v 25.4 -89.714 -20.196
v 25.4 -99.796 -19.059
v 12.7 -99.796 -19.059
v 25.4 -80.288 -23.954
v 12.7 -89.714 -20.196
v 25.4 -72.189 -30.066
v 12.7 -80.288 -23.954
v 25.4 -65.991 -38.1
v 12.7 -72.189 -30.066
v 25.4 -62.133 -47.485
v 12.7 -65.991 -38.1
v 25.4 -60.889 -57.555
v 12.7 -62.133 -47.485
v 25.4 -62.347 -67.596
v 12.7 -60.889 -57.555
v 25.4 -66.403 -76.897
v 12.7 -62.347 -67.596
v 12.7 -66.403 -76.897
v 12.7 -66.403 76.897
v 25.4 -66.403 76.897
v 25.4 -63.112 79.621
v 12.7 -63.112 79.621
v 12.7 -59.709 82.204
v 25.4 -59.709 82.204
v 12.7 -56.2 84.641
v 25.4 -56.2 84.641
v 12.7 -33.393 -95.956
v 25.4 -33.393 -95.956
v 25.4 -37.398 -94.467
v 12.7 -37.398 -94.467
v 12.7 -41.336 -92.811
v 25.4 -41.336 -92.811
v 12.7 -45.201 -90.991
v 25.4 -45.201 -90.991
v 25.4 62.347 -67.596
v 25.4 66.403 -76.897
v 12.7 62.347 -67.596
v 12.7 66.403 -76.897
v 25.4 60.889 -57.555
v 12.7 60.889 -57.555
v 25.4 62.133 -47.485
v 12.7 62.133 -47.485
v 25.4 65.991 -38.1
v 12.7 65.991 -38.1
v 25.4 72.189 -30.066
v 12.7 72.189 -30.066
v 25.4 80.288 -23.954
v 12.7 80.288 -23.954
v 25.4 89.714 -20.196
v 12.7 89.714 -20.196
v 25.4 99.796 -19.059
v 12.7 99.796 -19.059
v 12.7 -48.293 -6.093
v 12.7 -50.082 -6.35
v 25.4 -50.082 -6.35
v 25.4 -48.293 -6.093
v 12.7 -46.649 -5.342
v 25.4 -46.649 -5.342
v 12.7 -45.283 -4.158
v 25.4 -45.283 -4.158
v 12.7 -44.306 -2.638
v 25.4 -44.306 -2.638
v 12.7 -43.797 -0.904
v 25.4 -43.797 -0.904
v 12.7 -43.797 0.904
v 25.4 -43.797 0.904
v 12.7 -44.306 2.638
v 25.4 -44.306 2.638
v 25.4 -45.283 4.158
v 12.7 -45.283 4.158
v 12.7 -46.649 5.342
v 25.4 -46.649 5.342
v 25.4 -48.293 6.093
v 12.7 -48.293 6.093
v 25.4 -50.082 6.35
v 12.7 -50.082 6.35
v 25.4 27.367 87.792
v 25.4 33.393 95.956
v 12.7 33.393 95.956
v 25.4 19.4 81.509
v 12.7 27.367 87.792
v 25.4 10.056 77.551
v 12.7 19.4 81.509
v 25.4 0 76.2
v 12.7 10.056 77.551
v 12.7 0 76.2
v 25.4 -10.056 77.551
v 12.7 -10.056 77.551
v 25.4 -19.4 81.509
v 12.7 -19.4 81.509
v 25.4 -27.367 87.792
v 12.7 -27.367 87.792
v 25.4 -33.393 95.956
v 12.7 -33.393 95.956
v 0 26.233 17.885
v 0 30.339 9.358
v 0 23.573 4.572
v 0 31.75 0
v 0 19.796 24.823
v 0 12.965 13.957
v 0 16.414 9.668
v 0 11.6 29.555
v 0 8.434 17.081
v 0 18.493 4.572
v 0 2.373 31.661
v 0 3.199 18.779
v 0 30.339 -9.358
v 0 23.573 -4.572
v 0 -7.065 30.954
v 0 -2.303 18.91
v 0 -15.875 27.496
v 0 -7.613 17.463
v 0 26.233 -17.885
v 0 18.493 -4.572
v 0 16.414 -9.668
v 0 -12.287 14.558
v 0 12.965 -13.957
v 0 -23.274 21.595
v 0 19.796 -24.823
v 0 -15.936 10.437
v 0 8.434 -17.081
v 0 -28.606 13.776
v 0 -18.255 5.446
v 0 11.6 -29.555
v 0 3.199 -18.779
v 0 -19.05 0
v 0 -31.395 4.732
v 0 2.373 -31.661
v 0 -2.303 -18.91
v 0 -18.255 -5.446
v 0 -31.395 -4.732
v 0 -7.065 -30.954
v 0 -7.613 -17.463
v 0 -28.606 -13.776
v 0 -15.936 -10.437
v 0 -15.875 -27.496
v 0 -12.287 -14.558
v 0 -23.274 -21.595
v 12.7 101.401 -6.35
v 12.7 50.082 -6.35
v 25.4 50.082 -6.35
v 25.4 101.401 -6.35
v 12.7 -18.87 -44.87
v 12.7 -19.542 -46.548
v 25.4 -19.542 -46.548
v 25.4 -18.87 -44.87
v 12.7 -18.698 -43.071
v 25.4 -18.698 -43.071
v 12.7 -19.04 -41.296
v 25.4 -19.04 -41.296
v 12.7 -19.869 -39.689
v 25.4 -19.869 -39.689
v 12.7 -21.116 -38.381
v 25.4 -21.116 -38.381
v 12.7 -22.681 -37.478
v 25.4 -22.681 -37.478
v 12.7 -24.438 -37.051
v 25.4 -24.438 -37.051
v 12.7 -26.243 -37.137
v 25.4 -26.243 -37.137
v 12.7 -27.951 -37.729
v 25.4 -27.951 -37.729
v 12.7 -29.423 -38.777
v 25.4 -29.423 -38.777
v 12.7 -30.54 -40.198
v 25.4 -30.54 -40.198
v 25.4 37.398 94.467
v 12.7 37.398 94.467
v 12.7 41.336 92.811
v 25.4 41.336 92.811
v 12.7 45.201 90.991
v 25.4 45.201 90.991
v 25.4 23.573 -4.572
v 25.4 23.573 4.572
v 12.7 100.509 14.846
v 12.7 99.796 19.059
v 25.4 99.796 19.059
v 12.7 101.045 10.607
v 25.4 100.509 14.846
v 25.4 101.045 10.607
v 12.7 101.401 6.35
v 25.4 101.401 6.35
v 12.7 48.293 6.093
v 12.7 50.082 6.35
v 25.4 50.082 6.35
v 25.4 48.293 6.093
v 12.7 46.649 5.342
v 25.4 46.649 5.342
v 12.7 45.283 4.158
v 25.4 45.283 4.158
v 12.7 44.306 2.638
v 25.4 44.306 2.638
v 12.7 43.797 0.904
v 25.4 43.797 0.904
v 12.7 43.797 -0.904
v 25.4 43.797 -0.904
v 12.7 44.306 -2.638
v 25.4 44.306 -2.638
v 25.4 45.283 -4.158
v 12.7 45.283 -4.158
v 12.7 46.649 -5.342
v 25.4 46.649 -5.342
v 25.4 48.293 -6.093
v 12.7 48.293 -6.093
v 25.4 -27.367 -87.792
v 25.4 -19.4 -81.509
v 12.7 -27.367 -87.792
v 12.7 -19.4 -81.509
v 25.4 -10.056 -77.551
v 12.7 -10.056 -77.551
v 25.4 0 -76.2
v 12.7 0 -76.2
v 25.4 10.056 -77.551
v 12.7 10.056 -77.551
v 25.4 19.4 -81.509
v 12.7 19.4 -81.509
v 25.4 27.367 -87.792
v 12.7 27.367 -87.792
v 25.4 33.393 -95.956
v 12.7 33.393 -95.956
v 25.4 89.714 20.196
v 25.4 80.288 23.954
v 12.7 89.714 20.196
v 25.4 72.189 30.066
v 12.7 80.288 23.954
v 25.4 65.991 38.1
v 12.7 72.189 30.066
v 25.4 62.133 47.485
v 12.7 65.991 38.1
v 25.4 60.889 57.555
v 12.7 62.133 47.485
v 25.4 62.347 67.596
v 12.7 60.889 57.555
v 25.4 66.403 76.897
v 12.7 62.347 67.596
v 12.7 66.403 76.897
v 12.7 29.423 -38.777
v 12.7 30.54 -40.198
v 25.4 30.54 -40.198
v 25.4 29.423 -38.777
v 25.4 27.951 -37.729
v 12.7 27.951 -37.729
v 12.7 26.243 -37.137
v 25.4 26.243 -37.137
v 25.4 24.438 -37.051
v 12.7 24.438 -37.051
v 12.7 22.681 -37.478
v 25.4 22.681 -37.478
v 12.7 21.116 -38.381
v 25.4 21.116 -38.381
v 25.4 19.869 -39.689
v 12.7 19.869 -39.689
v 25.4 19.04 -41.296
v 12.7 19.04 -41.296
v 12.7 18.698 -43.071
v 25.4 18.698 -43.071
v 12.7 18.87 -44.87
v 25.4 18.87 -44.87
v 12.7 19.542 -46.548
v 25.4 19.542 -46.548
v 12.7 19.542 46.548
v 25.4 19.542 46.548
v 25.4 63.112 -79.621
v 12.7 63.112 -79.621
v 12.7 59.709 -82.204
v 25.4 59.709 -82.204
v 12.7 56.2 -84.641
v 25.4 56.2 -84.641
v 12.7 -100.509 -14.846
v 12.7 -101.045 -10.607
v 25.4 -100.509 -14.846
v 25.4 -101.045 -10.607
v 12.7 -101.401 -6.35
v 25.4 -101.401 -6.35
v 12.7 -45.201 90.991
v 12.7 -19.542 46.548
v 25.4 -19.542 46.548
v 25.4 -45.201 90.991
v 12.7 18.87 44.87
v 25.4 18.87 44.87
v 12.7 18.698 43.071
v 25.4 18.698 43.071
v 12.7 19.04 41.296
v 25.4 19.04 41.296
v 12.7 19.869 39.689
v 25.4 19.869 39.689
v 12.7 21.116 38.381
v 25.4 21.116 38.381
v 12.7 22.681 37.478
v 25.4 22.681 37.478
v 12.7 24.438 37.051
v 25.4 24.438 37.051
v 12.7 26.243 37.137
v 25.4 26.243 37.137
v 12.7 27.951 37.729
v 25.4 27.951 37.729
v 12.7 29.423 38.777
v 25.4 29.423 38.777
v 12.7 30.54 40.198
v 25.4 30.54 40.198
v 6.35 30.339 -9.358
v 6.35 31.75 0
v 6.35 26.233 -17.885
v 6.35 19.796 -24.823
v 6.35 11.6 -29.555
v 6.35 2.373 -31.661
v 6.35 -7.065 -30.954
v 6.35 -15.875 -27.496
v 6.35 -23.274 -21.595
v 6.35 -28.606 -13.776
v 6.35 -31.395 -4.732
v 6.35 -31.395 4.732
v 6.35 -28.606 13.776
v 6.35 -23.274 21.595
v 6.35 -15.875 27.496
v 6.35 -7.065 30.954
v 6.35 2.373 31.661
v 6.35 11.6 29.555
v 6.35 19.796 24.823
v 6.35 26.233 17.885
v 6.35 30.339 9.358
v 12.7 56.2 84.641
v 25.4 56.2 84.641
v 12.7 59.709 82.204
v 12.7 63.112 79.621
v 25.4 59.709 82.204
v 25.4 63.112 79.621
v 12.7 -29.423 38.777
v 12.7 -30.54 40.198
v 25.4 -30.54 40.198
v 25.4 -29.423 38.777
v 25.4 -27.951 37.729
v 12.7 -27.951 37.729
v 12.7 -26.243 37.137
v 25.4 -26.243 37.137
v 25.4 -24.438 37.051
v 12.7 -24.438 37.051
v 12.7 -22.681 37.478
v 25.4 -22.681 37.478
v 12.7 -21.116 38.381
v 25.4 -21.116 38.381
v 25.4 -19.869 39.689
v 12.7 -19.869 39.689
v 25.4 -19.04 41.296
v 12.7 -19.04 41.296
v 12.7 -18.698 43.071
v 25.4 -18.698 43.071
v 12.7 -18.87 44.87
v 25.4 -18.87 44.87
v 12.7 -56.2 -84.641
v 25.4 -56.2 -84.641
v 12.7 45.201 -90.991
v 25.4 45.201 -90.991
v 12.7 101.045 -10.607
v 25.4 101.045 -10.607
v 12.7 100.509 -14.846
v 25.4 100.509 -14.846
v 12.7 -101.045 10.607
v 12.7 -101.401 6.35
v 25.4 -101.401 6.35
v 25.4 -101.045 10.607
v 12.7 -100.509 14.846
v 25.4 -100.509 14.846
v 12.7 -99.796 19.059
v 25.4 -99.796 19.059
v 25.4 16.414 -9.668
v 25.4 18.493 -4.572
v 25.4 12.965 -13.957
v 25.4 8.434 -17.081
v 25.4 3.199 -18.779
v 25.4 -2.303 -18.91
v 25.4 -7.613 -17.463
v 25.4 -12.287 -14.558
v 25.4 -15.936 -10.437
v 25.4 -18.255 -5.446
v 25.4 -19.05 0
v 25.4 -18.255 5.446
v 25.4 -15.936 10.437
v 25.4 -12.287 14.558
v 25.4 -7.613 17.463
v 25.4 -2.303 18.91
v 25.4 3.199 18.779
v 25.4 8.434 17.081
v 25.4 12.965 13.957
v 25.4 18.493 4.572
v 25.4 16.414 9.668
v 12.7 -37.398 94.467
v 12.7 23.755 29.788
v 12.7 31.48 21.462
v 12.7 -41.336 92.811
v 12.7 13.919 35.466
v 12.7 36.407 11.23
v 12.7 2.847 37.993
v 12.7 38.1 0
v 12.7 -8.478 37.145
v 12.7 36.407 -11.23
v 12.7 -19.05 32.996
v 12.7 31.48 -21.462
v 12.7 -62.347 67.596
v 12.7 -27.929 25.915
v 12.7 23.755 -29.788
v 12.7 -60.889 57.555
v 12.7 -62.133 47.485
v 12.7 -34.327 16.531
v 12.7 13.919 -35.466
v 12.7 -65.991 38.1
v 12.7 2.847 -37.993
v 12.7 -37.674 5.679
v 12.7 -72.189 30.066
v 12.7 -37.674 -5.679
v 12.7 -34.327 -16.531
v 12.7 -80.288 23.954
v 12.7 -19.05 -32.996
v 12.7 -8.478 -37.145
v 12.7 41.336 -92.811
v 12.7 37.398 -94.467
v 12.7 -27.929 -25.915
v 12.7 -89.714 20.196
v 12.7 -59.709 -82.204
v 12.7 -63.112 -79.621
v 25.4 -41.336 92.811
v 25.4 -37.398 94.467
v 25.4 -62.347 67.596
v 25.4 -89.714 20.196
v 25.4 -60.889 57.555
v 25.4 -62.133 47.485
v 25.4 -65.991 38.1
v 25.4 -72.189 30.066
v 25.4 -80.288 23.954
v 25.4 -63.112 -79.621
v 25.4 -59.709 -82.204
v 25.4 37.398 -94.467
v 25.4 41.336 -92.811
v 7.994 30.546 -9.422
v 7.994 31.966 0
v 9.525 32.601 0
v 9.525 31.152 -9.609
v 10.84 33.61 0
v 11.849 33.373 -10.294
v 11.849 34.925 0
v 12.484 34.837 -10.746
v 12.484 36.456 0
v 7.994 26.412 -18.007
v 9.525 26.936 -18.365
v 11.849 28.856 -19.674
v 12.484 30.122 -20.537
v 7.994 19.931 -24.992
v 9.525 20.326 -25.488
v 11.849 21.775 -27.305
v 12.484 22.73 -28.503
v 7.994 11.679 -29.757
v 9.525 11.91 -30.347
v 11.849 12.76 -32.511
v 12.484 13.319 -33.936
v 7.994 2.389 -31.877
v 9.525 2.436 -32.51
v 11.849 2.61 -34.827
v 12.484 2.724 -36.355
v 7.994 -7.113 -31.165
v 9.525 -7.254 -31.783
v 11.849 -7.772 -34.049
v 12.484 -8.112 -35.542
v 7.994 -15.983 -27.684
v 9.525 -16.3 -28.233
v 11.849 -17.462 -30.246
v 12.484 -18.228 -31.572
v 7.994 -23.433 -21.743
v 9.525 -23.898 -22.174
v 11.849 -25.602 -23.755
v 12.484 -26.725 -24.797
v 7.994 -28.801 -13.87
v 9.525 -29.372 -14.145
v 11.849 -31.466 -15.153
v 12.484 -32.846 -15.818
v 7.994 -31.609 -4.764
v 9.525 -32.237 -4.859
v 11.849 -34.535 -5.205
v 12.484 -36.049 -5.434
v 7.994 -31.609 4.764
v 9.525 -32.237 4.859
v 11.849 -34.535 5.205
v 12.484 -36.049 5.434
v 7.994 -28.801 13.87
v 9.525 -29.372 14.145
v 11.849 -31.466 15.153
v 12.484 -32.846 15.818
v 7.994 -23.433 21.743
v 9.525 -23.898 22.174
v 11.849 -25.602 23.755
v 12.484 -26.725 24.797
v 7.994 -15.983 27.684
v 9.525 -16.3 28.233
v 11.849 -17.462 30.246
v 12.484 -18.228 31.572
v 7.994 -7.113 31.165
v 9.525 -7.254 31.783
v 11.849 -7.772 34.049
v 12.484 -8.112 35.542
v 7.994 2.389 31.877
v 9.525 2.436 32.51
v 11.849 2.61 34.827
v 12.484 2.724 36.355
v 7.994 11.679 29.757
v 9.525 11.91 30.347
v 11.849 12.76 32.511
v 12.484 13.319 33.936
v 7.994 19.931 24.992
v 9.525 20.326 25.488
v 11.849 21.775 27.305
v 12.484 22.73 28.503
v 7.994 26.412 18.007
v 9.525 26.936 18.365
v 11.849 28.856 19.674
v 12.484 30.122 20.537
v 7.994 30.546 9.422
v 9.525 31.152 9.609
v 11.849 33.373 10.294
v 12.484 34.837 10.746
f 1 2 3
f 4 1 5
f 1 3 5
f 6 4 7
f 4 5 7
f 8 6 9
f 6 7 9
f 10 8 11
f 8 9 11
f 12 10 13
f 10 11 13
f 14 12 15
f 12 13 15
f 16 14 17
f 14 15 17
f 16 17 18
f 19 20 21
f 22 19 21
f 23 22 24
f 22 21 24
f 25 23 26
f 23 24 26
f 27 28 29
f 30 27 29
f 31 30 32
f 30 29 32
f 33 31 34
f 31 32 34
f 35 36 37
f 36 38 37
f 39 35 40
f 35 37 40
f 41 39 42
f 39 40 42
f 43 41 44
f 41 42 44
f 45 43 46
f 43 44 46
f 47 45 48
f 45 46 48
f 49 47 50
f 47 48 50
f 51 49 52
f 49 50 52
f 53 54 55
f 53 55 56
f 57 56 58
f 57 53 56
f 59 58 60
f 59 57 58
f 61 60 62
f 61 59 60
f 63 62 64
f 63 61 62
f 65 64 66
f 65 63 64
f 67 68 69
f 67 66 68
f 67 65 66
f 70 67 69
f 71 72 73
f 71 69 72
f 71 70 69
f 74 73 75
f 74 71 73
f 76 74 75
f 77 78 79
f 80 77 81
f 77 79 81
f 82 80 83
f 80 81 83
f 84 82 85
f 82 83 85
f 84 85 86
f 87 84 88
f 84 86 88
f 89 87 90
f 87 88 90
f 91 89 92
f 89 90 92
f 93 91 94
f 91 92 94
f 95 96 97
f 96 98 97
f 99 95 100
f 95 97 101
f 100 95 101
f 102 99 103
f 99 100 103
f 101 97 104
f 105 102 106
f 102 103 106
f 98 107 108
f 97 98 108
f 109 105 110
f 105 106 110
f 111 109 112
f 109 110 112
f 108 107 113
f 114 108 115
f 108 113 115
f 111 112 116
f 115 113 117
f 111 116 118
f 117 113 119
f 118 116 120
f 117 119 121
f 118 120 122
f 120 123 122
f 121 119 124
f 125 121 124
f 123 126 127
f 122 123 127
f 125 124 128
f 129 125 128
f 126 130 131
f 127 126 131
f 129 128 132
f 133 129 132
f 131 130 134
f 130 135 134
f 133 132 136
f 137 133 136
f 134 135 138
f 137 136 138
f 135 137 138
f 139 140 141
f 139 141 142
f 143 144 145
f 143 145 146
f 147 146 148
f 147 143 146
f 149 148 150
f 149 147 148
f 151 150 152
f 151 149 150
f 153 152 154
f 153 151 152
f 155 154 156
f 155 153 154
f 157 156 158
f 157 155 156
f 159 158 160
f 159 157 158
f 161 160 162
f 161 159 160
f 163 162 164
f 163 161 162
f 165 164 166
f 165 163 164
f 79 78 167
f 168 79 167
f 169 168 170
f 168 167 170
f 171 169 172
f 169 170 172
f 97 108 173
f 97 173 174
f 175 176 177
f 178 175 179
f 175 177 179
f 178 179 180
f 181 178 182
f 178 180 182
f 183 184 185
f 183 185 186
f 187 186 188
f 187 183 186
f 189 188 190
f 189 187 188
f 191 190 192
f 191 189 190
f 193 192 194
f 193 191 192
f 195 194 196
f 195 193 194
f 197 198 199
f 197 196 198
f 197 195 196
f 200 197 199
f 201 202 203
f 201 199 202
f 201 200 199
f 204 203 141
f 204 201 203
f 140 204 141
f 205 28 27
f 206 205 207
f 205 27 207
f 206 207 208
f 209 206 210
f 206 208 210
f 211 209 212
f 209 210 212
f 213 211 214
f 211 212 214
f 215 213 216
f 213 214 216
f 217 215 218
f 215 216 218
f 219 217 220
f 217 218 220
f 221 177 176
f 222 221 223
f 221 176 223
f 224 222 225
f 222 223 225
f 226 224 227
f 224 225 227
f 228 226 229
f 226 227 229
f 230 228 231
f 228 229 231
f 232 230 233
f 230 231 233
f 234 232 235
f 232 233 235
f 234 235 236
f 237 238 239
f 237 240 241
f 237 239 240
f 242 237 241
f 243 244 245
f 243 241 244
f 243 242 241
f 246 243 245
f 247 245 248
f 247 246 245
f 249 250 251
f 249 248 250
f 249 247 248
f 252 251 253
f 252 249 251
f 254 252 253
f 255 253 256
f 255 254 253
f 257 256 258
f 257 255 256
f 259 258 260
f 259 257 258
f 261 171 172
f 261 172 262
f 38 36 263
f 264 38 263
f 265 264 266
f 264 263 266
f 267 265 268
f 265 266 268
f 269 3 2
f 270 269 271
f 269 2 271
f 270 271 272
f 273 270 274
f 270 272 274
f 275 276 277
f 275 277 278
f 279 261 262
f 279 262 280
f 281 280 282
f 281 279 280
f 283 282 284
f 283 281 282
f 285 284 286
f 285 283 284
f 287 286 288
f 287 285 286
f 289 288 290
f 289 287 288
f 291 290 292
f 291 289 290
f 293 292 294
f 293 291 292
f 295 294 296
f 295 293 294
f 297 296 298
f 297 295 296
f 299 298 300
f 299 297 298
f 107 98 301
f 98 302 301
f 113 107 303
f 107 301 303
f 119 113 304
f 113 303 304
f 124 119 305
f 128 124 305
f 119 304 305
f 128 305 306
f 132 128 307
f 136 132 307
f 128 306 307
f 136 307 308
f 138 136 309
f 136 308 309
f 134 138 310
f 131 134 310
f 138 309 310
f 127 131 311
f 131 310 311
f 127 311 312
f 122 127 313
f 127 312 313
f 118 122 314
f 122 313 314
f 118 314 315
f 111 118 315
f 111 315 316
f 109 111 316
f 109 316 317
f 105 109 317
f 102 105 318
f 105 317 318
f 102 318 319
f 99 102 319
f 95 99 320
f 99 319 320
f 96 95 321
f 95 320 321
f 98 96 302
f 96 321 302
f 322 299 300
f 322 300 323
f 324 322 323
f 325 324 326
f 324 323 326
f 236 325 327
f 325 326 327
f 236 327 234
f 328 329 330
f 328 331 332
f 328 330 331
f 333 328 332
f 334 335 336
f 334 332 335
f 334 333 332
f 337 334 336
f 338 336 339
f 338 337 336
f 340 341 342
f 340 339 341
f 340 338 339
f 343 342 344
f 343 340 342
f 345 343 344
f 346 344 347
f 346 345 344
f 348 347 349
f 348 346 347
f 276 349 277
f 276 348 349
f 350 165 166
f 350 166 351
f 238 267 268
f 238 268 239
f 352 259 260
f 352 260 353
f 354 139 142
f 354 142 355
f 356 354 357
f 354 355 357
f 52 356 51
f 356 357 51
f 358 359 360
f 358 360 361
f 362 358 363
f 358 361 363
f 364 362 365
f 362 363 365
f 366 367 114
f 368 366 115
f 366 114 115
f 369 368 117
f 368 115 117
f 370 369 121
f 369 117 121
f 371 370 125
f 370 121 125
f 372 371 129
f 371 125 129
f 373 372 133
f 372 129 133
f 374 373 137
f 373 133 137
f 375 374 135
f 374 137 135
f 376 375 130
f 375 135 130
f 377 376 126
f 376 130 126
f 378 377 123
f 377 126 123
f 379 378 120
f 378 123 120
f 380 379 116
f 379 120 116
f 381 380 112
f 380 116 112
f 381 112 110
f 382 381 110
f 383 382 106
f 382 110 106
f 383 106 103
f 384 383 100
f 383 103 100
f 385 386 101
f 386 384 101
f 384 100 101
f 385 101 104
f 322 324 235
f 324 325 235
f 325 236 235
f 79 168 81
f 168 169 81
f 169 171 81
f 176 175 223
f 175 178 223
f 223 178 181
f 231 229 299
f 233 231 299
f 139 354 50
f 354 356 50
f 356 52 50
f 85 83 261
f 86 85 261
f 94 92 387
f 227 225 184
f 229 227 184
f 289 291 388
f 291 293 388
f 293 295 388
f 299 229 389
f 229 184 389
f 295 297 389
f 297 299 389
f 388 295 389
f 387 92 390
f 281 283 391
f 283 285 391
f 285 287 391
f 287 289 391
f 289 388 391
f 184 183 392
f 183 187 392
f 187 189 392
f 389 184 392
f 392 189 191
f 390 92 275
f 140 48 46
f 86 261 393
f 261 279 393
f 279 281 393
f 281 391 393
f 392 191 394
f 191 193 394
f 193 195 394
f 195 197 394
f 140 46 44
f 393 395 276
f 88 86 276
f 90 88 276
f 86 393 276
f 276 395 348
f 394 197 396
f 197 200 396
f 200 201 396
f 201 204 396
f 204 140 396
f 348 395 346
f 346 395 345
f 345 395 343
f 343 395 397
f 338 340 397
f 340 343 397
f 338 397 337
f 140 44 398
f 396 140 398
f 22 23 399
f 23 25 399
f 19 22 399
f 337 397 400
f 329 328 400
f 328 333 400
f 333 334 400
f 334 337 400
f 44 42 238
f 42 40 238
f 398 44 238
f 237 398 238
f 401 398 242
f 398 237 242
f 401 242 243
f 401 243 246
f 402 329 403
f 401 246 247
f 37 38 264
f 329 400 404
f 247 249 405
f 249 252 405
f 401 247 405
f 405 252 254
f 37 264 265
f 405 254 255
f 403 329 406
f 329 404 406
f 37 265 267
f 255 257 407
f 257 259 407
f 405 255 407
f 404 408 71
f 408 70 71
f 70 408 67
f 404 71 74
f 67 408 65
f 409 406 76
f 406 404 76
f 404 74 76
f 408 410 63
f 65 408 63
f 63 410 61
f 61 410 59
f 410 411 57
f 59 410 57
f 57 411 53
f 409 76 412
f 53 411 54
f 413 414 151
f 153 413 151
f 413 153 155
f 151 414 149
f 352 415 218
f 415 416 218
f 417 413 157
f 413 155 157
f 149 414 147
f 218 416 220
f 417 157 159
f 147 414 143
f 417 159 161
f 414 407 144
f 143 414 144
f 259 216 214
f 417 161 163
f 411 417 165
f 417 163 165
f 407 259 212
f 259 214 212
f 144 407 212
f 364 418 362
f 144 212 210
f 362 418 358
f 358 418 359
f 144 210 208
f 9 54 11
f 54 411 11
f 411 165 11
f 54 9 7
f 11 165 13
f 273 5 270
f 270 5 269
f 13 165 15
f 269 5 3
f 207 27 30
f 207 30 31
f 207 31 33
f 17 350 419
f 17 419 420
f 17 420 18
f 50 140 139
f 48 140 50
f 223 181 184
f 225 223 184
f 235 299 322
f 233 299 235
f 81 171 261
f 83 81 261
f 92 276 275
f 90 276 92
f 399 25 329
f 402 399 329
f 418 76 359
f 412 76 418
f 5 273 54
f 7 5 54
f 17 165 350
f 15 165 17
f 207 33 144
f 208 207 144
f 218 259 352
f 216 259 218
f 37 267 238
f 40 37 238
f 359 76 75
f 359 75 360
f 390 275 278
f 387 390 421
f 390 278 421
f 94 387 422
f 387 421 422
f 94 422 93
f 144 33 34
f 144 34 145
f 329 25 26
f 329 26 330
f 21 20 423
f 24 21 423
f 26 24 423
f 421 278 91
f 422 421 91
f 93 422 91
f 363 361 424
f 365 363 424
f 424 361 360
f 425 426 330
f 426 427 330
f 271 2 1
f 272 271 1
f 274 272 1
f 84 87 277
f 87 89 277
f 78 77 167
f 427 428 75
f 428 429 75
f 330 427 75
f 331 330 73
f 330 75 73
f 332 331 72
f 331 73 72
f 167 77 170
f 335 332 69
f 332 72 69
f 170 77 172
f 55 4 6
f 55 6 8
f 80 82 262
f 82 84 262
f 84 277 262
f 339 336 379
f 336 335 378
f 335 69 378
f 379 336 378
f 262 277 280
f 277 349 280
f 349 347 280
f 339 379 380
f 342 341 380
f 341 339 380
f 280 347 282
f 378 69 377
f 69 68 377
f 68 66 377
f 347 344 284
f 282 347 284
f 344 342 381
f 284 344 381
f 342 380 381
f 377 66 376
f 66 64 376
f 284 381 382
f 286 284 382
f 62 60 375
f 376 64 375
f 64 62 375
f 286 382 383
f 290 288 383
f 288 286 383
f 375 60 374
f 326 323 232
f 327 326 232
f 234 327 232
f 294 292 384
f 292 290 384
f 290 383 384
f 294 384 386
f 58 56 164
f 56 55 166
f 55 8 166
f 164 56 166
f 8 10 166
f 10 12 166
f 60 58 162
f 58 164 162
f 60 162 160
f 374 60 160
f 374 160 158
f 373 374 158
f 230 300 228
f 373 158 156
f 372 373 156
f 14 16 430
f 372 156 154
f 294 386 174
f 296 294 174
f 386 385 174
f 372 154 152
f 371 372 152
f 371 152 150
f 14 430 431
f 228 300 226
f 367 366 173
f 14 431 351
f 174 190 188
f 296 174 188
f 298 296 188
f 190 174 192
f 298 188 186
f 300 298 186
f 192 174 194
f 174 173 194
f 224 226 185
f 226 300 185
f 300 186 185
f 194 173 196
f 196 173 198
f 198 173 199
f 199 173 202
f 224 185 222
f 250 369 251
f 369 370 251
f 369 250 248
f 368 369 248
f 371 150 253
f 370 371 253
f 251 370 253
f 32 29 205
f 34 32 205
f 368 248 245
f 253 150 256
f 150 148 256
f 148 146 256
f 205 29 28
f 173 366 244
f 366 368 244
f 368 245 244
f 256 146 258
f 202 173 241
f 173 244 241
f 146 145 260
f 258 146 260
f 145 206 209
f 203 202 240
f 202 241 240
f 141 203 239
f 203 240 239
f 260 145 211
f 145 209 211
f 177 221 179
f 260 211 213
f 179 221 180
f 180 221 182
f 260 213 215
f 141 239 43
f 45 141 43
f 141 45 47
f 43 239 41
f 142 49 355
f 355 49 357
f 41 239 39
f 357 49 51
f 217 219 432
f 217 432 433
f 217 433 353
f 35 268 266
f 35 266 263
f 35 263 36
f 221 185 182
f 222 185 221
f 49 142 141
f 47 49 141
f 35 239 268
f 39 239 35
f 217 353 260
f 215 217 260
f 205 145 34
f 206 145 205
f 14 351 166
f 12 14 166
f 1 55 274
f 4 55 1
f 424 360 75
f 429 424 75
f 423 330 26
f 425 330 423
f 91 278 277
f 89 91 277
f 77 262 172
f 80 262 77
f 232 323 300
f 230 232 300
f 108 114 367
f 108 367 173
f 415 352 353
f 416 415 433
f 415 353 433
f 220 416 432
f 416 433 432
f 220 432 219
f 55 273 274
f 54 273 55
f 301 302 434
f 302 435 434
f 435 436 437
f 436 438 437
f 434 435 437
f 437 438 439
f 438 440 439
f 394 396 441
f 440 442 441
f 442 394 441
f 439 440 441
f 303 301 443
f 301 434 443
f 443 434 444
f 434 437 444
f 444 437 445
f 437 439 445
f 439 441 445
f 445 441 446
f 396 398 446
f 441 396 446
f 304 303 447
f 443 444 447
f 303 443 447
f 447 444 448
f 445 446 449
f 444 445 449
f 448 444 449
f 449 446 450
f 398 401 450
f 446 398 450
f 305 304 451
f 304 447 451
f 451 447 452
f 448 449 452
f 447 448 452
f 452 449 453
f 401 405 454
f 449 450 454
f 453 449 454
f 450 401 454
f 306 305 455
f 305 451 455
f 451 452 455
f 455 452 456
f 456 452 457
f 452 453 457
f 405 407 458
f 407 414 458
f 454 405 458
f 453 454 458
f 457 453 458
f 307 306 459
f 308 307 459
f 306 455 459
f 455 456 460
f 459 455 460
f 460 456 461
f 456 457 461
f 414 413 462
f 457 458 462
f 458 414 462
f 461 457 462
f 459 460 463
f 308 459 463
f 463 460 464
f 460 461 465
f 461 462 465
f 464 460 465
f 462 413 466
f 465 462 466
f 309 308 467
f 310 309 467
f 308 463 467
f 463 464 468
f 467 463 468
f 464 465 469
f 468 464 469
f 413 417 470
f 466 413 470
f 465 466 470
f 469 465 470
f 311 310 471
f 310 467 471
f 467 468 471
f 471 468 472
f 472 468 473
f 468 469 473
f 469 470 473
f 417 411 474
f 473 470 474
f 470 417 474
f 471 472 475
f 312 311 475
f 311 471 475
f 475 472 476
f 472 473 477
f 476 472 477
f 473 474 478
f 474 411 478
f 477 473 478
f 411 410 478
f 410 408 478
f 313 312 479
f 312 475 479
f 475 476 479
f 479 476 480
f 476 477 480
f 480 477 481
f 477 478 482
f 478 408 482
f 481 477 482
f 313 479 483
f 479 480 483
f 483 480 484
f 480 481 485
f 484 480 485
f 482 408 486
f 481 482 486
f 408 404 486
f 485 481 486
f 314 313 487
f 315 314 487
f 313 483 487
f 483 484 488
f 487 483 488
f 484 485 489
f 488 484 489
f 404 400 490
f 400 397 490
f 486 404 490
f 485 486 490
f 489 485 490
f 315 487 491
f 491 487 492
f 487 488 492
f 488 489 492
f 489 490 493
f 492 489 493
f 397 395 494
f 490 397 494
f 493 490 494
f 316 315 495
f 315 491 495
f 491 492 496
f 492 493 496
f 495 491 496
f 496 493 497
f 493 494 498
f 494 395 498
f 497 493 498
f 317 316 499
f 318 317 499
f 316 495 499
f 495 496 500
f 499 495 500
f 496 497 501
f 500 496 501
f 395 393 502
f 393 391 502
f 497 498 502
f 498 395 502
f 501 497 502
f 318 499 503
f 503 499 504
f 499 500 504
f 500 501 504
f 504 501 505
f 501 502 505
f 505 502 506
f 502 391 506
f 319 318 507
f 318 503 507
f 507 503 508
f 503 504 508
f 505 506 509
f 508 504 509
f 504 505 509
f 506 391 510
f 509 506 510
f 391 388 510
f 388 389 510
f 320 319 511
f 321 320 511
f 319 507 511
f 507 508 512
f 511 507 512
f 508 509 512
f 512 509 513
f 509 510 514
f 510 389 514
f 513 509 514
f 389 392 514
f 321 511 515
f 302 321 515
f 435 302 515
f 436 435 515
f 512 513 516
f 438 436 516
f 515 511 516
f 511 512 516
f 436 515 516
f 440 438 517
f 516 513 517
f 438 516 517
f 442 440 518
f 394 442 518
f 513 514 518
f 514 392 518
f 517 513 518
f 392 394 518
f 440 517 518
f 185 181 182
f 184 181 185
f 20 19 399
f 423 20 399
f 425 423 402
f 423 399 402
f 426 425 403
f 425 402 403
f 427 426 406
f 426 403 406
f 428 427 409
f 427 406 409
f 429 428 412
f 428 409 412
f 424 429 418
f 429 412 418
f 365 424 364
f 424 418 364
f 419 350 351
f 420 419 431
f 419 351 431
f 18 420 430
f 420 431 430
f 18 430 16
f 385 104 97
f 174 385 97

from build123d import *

# Parameters (mm, degrees)
SKETCH2_R          = 19.05
CUT_EXTRUDE1_DEPTH = 26.4
SKETCH3_R          = 38.1
CUT_EXTRUDE2_DEPTH = 13.7
CUT_EXTRUDE5_DEPTH = 13.7
SKETCH6_W          = 9.144
SKETCH6_H          = 5.08
CUT_EXTRUDE6_DEPTH = 26.4


with BuildPart() as part:
    # Sketch1 → Revolve1 (revolve)
    with BuildSketch(Plane.XY):
        with BuildLine():
            Line((0, 0), (0, 31.75))
            Line((0, 31.75), (6.35, 31.75))
            ThreePointArc((6.35, 31.75), (10.840128061, 33.609871939), (12.7, 38.1))
            Line((12.7, 38.1), (12.7, 101.6))
            Line((12.7, 101.6), (25.4, 101.6))
            Line((25.4, 101.6), (25.4, 0))
            Line((25.4, 0), (0, 0))
        make_face()
    revolve(axis=Axis((25.4, 0, 0), (-1, 0, 0)))

    # Sketch2 → Cut-Extrude1 (cut, through all)
    with BuildSketch(Plane.ZY):
        Circle(SKETCH2_R)
    extrude(amount=-CUT_EXTRUDE1_DEPTH, mode=Mode.SUBTRACT)

    # Sketch3 → Cut-Extrude2 (cut, through all)
    with BuildSketch(Plane.ZY.offset(-12.7)):
        with Locations((114.3, 0)):
            Circle(SKETCH3_R)
        with Locations((57.15, -98.986703653)):
            Circle(SKETCH3_R)
        with Locations((-57.15, -98.986703653)):
            Circle(SKETCH3_R)
        with Locations((-114.3, 0)):
            Circle(SKETCH3_R)
        with Locations((-57.15, 98.986703653)):
            Circle(SKETCH3_R)
        with Locations((57.15, 98.986703653)):
            Circle(SKETCH3_R)
    extrude(amount=-CUT_EXTRUDE2_DEPTH, mode=Mode.SUBTRACT)

    # Sketch5 → Cut-Extrude5 (cut, through all)
    with BuildSketch(Plane.ZY.offset(-12.7)):
        with BuildLine():
            Line((113.723029824, 58.325673463), (46.547661143, 19.541956272))
            ThreePointArc((46.547661143, 19.541956272), (37.873399829, 21.866217586), (40.197661143, 30.5404789))
            Line((40.197661143, 30.5404789), (107.373029824, 69.324196091))
            Line((107.373029824, 69.324196091), (113.723029824, 58.325673463))
        make_face()
        with BuildLine():
            Line((-6.35, 127.649869555), (6.35, 127.649869555))
            Line((6.35, 127.649869555), (6.35, 50.082435173))
            ThreePointArc((6.35, 50.082435173), (0, 43.732435173), (-6.35, 50.082435173))
            Line((-6.35, 50.082435173), (-6.35, 127.649869555))
        make_face()
        with BuildLine():
            Line((107.373029824, -69.324196091), (40.197661143, -30.5404789))
            ThreePointArc((40.197661143, -30.5404789), (37.873399829, -21.866217586), (46.547661143, -19.541956272))
            Line((46.547661143, -19.541956272), (113.723029824, -58.325673463))
            Line((113.723029824, -58.325673463), (107.373029824, -69.324196091))
        make_face()
        with BuildLine():
            Line((-6.35, -127.649869555), (-6.35, -50.082435173))
            ThreePointArc((-6.35, -50.082435173), (0, -43.732435173), (6.35, -50.082435173))
            Line((6.35, -50.082435173), (6.35, -127.649869555))
            Line((6.35, -127.649869555), (-6.35, -127.649869555))
        make_face()
        with BuildLine():
            Line((-113.723029824, -58.325673463), (-46.547661143, -19.541956272))
            ThreePointArc((-46.547661143, -19.541956272), (-37.873399829, -21.866217586), (-40.197661143, -30.5404789))
            Line((-40.197661143, -30.5404789), (-107.373029824, -69.324196091))
            Line((-107.373029824, -69.324196091), (-113.723029824, -58.325673463))
        make_face()
        with BuildLine():
            Line((-107.373029824, 69.324196091), (-40.197661143, 30.5404789))
            ThreePointArc((-40.197661143, 30.5404789), (-37.873399829, 21.866217586), (-46.547661143, 19.541956272))
            Line((-46.547661143, 19.541956272), (-113.723029824, 58.325673463))
            Line((-113.723029824, 58.325673463), (-107.373029824, 69.324196091))
        make_face()
    extrude(amount=-CUT_EXTRUDE5_DEPTH, mode=Mode.SUBTRACT)

    # Sketch6 → Cut-Extrude6 (cut, through all)
    with BuildSketch(Plane.ZY):
        with Locations((0, 21.033223516)):
            Rectangle(SKETCH6_W, SKETCH6_H)
    extrude(amount=-CUT_EXTRUDE6_DEPTH, mode=Mode.SUBTRACT)


solid = part.part
